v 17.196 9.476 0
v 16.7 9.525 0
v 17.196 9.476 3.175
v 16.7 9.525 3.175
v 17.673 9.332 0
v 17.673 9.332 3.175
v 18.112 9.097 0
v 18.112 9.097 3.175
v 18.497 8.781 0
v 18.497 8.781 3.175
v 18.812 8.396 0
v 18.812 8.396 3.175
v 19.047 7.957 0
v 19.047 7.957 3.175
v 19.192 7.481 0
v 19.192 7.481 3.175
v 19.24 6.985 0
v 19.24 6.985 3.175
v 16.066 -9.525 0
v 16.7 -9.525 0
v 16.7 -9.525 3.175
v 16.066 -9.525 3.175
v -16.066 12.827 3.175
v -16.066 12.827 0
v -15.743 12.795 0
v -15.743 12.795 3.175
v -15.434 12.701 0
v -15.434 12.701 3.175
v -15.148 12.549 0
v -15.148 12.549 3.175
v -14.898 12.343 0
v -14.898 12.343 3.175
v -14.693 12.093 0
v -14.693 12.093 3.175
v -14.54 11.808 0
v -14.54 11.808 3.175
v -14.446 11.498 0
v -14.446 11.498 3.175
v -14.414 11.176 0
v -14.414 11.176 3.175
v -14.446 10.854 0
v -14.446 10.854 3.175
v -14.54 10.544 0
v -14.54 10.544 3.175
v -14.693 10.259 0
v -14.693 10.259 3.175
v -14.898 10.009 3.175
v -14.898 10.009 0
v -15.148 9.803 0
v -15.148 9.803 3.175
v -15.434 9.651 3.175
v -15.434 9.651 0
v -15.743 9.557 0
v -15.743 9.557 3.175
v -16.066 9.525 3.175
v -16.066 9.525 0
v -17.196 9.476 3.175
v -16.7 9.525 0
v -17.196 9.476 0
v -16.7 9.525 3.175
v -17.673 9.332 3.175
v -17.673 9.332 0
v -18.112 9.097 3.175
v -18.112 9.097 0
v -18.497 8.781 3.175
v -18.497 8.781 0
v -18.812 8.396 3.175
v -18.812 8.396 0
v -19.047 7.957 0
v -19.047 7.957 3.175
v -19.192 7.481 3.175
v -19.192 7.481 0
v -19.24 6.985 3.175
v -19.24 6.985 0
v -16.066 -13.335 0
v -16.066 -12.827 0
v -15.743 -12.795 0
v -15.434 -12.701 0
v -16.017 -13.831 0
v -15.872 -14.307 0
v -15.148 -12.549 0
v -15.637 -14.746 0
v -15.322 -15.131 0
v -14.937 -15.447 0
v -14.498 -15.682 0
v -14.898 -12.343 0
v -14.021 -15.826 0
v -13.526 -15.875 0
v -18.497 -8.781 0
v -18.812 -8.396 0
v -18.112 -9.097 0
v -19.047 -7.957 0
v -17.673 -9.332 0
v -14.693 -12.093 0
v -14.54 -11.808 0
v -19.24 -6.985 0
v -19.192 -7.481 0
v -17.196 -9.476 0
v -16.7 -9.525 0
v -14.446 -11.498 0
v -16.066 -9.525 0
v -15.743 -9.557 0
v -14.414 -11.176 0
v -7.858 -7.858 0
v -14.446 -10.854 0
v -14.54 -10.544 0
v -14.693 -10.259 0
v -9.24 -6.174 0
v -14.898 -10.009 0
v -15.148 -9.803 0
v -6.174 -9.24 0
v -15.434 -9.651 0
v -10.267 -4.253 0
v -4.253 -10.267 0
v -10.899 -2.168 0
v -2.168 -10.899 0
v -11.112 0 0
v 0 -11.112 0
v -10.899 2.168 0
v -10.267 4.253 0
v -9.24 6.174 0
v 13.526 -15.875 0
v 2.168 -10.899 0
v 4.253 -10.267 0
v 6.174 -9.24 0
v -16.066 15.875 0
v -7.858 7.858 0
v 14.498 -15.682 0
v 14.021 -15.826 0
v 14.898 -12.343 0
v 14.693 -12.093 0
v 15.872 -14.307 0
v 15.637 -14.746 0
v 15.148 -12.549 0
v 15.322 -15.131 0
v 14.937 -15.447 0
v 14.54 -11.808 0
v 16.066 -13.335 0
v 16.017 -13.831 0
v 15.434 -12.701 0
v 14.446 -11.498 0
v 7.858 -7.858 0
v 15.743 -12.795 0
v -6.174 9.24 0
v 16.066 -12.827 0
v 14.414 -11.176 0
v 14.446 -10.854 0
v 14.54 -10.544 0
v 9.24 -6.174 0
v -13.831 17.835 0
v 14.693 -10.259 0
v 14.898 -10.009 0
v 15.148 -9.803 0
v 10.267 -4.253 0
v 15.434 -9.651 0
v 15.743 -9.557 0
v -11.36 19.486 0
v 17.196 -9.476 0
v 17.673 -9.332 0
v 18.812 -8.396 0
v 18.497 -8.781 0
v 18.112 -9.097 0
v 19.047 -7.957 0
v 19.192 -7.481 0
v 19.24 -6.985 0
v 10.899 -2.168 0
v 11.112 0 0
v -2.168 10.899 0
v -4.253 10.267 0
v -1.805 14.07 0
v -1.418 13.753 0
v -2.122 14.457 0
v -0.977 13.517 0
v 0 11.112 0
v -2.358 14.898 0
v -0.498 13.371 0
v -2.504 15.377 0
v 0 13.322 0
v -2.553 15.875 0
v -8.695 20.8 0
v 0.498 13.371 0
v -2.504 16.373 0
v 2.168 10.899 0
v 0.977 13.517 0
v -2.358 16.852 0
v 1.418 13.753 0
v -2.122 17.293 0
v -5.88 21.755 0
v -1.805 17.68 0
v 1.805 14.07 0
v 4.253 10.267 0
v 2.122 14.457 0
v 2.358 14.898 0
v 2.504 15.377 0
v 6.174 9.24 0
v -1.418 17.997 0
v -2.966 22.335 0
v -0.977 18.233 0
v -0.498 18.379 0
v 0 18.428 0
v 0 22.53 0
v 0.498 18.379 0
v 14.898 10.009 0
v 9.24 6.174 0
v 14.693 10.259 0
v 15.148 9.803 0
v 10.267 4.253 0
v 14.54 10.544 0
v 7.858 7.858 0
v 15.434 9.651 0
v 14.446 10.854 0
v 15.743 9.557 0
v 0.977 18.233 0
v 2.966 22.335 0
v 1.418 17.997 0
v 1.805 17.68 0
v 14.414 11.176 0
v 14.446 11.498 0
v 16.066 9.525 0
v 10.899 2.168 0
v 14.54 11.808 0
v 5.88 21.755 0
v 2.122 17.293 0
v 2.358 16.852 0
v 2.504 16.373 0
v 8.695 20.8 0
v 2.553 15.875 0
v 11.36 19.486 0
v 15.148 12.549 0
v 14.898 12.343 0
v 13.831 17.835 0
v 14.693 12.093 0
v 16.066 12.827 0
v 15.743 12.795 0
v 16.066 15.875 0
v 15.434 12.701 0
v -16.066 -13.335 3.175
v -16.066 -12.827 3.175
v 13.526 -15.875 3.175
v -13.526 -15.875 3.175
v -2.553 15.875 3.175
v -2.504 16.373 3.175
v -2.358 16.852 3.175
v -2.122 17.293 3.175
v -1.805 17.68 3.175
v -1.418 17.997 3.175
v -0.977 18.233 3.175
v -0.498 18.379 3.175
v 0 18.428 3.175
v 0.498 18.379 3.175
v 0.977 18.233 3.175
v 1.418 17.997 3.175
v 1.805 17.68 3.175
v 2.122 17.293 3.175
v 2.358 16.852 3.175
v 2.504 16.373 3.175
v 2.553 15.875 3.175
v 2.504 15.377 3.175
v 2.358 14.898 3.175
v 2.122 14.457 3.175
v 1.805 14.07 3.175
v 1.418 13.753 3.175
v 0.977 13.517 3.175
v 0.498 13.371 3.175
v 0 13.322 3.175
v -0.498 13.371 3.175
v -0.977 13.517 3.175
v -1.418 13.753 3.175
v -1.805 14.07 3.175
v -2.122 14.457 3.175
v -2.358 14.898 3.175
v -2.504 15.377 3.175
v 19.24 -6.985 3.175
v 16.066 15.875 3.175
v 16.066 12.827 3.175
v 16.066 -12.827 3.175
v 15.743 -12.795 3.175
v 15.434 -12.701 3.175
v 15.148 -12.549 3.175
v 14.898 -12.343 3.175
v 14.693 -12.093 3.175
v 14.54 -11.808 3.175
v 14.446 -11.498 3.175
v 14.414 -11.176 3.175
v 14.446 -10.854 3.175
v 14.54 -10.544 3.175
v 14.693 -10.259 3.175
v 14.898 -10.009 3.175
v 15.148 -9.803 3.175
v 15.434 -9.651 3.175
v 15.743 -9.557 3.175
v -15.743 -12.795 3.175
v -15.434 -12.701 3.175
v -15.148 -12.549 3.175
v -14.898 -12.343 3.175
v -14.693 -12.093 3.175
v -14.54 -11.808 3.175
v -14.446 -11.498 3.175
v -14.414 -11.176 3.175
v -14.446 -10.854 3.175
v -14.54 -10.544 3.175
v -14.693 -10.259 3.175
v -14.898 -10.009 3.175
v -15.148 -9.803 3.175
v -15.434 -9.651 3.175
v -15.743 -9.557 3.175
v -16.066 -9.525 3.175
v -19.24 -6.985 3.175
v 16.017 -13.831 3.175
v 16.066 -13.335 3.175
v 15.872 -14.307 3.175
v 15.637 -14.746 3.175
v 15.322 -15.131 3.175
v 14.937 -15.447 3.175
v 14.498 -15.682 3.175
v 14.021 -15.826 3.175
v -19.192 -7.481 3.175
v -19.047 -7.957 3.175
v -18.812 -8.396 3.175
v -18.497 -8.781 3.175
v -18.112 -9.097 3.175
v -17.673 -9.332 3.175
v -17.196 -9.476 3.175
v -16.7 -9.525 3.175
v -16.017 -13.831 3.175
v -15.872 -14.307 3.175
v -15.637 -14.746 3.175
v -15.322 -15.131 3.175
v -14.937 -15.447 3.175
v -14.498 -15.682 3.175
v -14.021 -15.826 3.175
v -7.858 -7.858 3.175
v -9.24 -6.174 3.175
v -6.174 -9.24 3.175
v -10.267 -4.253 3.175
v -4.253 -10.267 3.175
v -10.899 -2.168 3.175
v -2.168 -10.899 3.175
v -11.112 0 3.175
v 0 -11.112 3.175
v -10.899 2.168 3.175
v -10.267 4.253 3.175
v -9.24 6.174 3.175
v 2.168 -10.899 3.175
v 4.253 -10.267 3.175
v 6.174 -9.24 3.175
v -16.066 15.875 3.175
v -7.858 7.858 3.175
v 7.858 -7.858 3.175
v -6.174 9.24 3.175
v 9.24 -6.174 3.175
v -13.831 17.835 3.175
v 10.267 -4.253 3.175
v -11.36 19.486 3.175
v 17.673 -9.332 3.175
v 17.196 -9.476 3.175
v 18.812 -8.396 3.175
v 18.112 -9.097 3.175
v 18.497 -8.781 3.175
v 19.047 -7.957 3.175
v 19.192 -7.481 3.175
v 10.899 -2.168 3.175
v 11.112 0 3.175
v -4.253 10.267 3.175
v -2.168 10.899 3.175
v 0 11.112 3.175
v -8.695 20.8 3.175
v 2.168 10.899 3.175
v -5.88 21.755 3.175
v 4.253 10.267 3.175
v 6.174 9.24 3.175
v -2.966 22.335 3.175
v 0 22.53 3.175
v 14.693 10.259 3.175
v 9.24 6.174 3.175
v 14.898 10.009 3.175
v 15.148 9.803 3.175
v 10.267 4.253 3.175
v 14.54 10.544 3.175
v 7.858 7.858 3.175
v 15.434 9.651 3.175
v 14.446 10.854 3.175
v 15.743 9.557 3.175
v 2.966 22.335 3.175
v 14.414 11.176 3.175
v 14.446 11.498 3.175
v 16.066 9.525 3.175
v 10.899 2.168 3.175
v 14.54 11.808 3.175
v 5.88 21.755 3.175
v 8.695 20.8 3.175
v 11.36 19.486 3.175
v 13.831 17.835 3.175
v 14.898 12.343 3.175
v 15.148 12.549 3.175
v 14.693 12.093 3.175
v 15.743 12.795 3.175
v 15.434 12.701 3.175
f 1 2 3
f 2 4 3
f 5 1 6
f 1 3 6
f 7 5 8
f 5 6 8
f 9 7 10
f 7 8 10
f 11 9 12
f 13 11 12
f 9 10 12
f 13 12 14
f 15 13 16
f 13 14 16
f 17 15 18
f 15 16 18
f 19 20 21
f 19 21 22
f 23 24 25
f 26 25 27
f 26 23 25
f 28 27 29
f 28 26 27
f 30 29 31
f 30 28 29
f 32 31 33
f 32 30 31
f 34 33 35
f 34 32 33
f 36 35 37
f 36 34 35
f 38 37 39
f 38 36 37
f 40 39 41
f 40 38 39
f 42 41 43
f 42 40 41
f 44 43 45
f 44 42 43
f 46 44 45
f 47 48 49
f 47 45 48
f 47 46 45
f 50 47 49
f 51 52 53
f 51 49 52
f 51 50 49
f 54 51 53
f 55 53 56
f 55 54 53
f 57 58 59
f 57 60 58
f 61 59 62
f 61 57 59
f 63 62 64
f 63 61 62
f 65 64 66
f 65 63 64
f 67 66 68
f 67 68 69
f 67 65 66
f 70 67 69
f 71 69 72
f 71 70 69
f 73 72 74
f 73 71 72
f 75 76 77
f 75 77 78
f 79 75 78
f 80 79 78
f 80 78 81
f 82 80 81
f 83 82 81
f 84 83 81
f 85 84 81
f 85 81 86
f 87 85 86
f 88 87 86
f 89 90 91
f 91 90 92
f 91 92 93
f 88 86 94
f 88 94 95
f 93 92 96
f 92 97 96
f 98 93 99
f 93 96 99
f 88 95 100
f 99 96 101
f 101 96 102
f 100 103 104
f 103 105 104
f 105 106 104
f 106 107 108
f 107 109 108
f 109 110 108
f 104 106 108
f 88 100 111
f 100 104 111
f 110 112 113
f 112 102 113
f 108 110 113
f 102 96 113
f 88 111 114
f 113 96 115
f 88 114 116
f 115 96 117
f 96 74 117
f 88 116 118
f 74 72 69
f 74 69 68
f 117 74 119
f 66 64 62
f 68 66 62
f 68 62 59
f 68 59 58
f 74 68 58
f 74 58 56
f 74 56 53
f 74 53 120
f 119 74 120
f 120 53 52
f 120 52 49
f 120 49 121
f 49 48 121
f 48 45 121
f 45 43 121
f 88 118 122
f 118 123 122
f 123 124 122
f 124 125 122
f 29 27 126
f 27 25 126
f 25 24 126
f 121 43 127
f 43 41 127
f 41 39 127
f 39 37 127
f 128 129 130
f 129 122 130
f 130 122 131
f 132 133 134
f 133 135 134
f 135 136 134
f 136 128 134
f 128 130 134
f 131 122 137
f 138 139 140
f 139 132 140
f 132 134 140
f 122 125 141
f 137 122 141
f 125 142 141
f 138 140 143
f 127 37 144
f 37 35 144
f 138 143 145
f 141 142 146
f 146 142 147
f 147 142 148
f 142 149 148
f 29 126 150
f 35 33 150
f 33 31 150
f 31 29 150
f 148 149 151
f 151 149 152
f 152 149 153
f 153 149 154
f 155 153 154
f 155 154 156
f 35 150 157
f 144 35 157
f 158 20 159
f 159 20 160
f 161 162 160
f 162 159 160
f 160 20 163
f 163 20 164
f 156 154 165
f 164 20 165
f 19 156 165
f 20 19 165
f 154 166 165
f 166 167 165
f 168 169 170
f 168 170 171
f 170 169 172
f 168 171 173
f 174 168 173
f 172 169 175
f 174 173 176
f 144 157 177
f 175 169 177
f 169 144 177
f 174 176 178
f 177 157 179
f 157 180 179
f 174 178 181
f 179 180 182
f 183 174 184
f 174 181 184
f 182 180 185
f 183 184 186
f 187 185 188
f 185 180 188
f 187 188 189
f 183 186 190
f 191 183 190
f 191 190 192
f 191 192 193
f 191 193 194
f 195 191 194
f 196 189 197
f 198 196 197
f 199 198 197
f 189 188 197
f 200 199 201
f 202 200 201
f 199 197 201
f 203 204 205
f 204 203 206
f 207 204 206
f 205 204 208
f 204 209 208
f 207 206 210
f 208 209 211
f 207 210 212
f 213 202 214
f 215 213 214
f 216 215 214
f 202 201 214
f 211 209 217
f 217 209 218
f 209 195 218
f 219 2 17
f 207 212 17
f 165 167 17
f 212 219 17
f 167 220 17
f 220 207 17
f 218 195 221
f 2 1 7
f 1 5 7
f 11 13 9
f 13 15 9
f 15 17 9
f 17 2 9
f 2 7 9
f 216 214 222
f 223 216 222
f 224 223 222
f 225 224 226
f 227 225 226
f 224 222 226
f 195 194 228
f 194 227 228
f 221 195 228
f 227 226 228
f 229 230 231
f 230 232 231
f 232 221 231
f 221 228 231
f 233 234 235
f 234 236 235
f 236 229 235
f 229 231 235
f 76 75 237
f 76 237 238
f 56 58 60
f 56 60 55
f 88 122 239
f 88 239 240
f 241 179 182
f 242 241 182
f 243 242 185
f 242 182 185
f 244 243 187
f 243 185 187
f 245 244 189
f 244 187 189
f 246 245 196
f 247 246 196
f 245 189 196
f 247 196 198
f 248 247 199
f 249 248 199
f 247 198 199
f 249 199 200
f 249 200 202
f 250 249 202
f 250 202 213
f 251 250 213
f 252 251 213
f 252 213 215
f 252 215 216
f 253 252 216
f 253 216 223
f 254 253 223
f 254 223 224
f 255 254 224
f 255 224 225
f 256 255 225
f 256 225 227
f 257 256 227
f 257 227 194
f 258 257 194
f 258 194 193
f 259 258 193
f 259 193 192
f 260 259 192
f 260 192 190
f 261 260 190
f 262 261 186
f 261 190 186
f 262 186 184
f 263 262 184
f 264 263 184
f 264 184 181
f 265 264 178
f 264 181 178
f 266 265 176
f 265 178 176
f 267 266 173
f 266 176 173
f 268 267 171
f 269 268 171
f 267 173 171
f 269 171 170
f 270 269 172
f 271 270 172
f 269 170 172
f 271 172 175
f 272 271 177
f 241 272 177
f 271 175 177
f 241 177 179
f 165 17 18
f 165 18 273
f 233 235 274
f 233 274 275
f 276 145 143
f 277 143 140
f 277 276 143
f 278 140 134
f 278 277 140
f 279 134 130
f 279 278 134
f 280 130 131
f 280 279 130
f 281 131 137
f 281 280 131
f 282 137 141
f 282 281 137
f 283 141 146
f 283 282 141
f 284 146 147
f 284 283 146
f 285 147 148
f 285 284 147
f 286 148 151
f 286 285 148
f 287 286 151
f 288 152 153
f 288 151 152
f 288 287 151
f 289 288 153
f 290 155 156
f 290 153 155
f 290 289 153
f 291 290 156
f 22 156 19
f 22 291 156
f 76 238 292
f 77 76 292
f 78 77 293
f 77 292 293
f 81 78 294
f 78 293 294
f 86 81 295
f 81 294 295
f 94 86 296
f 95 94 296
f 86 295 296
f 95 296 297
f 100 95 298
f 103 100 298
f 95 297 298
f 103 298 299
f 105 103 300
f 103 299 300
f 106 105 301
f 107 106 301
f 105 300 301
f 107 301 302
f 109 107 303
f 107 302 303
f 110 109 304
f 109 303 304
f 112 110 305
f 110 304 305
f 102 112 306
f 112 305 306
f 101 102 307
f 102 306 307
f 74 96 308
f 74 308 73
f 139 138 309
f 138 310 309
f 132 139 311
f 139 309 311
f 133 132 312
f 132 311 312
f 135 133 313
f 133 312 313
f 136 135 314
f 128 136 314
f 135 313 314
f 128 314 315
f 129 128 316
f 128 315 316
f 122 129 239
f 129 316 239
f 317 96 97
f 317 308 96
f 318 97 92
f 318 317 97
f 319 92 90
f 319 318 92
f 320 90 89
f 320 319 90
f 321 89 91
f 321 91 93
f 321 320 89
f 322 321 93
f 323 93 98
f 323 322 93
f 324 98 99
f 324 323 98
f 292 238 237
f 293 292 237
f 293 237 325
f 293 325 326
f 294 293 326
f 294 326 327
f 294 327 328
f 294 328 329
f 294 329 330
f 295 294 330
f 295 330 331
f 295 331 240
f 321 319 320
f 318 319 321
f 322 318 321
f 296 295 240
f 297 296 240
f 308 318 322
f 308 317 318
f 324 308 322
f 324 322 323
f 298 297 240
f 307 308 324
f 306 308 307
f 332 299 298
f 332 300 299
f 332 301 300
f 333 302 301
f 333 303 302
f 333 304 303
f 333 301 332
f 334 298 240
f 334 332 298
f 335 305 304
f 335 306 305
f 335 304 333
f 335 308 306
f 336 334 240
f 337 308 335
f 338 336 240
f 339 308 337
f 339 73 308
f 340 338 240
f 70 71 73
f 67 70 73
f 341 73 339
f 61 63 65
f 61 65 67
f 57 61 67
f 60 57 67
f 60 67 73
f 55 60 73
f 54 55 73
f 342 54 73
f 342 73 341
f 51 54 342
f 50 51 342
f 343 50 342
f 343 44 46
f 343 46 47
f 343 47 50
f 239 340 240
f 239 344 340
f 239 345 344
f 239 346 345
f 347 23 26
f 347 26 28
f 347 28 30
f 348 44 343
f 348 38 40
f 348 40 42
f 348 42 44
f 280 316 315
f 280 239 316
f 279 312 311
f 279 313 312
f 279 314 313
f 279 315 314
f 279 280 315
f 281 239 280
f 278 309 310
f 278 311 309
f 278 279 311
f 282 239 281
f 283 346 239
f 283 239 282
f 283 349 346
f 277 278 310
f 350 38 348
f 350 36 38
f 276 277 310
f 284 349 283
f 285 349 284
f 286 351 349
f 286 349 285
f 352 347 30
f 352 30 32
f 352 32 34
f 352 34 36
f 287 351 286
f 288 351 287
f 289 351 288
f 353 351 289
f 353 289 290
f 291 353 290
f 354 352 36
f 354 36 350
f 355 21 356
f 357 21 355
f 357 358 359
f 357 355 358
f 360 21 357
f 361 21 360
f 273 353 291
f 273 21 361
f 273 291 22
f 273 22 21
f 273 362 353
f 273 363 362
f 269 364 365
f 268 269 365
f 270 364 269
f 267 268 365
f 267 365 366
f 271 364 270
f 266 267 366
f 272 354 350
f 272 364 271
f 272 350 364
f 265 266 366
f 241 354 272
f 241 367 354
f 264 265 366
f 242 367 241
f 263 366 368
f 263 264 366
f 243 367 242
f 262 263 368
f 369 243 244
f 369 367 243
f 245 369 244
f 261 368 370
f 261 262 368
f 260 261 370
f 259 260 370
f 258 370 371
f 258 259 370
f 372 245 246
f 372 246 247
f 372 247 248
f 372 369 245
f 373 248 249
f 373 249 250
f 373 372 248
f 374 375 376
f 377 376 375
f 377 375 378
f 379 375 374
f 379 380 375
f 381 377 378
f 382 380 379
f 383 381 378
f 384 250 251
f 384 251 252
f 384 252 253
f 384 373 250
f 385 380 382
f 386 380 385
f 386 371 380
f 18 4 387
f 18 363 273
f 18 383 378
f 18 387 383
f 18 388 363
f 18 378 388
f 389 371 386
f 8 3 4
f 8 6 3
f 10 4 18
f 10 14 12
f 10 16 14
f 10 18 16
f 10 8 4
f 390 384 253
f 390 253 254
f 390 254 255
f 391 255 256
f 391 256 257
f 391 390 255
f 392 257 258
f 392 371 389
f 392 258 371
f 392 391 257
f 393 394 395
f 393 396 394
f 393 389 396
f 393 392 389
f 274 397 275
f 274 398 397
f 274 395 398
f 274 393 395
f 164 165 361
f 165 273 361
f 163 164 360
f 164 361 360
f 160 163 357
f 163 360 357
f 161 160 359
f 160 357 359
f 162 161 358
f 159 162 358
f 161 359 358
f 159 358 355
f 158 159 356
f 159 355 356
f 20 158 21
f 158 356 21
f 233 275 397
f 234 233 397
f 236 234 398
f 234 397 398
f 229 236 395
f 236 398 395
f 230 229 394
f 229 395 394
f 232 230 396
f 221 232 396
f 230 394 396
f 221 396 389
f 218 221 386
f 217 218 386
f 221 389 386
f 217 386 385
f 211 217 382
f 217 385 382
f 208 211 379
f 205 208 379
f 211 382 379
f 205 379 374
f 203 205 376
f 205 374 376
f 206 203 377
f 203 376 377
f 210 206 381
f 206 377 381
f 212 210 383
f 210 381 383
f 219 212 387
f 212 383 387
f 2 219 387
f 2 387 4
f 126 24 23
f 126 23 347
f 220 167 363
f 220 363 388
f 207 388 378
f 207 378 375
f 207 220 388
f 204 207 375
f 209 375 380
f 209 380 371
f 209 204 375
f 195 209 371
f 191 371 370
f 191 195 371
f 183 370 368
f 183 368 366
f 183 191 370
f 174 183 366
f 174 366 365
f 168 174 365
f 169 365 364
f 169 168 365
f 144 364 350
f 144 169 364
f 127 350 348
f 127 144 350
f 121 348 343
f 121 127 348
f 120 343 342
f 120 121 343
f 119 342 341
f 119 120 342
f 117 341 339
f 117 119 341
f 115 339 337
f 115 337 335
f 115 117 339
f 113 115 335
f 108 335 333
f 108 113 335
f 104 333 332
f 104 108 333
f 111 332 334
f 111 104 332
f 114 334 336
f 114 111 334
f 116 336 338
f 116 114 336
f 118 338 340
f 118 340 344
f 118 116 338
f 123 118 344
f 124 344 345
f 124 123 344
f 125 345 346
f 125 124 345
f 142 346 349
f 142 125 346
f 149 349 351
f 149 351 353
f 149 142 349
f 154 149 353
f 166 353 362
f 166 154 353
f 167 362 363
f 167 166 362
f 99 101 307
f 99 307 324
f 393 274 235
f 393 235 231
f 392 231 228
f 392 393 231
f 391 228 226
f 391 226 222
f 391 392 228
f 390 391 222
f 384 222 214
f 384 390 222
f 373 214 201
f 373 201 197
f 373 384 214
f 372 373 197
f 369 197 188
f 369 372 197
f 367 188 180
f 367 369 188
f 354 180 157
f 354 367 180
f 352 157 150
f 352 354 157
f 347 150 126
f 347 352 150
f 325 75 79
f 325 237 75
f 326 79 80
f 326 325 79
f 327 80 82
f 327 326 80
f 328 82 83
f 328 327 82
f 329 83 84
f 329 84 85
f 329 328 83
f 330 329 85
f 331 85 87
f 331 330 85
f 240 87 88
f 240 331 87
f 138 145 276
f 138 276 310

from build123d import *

# Parameters (mm, degrees)
SKETCH1_R           = 11.1125
BOSS_EXTRUDE1_DEPTH = 3.175
BOSS_EXTRUDE3_DEPTH = 3.175
SKETCH4_R           = 2.5527
CUT_EXTRUDE2_DEPTH  = 4.175
FILLET1_R           = 2.54
CUT_EXTRUDE1_DEPTH  = 4.175


with BuildPart() as part:
    # Sketch1 → Boss-Extrude1 (new body)
    with BuildSketch(Plane.XY):
        Polygon((-19.2405, -9.525), (-19.2405, 9.525), (-16.0655, 9.525), (-16.0655, 15.875), (16.0655, 15.875), (16.0655, 9.525), (19.2405, 9.525), (19.2405, -9.525), (16.0655, -9.525), (16.0655, -15.875), (-16.0655, -15.875), (-16.0655, -9.525), align=None)
        Circle(SKETCH1_R, mode=Mode.SUBTRACT)
    extrude(amount=BOSS_EXTRUDE1_DEPTH)

    # Sketch3 → Boss-Extrude3 (add)
    with BuildSketch(Plane.XY.offset(3.175)):
        with BuildLine():
            Line((-16.0655, 15.875), (16.0655, 15.875))
            ThreePointArc((16.0655, 15.875), (0, 22.529547986), (-16.0655, 15.875))
        make_face()
    extrude(amount=-BOSS_EXTRUDE3_DEPTH)

    # Sketch4 → Cut-Extrude2 (cut, through all)
    with BuildSketch(Plane(origin=(0, 0, 0), x_dir=(-1, 0, 0), z_dir=(0, 0, -1))):
        with Locations((0, 15.875)):
            Circle(SKETCH4_R)
    extrude(amount=-CUT_EXTRUDE2_DEPTH, mode=Mode.SUBTRACT)

    # Fillet1
    fillet1_edges = [part.edges().sort_by_distance(p)[0] for p in [
        (19.2405, 9.525, 1.5875),
        (19.2405, -9.525, 1.5875),
        (16.0655, -15.875, 1.5875),
        (-16.0655, -15.875, 1.5875),
        (-19.2405, -9.525, 1.5875),
        (-19.2405, 9.525, 1.5875),
    ]]
    fillet(fillet1_edges, radius=FILLET1_R)

    # Sketch2 → Cut-Extrude1 (cut, through all)
    with BuildSketch(Plane.XY.offset(3.175)):
        with BuildLine():
            Line((-16.0655, -9.525), (-16.0655, -12.827))
            ThreePointArc((-16.0655, -12.827), (-14.4145, -11.176), (-16.0655, -9.525))
        make_face()
        with BuildLine():
            Line((16.0655, -9.525), (16.0655, -12.827))
            ThreePointArc((16.0655, -12.827), (14.4145, -11.176), (16.0655, -9.525))
        make_face()
        with BuildLine():
            Line((-16.0655, 9.525), (-16.0655, 12.827))
            ThreePointArc((-16.0655, 12.827), (-14.4145, 11.176), (-16.0655, 9.525))
        make_face()
        with BuildLine():
            Line((16.0655, 9.525), (16.0655, 12.827))
            ThreePointArc((16.0655, 12.827), (14.4145, 11.176), (16.0655, 9.525))
        make_face()
    extrude(amount=-CUT_EXTRUDE1_DEPTH, mode=Mode.SUBTRACT)


solid = part.part
